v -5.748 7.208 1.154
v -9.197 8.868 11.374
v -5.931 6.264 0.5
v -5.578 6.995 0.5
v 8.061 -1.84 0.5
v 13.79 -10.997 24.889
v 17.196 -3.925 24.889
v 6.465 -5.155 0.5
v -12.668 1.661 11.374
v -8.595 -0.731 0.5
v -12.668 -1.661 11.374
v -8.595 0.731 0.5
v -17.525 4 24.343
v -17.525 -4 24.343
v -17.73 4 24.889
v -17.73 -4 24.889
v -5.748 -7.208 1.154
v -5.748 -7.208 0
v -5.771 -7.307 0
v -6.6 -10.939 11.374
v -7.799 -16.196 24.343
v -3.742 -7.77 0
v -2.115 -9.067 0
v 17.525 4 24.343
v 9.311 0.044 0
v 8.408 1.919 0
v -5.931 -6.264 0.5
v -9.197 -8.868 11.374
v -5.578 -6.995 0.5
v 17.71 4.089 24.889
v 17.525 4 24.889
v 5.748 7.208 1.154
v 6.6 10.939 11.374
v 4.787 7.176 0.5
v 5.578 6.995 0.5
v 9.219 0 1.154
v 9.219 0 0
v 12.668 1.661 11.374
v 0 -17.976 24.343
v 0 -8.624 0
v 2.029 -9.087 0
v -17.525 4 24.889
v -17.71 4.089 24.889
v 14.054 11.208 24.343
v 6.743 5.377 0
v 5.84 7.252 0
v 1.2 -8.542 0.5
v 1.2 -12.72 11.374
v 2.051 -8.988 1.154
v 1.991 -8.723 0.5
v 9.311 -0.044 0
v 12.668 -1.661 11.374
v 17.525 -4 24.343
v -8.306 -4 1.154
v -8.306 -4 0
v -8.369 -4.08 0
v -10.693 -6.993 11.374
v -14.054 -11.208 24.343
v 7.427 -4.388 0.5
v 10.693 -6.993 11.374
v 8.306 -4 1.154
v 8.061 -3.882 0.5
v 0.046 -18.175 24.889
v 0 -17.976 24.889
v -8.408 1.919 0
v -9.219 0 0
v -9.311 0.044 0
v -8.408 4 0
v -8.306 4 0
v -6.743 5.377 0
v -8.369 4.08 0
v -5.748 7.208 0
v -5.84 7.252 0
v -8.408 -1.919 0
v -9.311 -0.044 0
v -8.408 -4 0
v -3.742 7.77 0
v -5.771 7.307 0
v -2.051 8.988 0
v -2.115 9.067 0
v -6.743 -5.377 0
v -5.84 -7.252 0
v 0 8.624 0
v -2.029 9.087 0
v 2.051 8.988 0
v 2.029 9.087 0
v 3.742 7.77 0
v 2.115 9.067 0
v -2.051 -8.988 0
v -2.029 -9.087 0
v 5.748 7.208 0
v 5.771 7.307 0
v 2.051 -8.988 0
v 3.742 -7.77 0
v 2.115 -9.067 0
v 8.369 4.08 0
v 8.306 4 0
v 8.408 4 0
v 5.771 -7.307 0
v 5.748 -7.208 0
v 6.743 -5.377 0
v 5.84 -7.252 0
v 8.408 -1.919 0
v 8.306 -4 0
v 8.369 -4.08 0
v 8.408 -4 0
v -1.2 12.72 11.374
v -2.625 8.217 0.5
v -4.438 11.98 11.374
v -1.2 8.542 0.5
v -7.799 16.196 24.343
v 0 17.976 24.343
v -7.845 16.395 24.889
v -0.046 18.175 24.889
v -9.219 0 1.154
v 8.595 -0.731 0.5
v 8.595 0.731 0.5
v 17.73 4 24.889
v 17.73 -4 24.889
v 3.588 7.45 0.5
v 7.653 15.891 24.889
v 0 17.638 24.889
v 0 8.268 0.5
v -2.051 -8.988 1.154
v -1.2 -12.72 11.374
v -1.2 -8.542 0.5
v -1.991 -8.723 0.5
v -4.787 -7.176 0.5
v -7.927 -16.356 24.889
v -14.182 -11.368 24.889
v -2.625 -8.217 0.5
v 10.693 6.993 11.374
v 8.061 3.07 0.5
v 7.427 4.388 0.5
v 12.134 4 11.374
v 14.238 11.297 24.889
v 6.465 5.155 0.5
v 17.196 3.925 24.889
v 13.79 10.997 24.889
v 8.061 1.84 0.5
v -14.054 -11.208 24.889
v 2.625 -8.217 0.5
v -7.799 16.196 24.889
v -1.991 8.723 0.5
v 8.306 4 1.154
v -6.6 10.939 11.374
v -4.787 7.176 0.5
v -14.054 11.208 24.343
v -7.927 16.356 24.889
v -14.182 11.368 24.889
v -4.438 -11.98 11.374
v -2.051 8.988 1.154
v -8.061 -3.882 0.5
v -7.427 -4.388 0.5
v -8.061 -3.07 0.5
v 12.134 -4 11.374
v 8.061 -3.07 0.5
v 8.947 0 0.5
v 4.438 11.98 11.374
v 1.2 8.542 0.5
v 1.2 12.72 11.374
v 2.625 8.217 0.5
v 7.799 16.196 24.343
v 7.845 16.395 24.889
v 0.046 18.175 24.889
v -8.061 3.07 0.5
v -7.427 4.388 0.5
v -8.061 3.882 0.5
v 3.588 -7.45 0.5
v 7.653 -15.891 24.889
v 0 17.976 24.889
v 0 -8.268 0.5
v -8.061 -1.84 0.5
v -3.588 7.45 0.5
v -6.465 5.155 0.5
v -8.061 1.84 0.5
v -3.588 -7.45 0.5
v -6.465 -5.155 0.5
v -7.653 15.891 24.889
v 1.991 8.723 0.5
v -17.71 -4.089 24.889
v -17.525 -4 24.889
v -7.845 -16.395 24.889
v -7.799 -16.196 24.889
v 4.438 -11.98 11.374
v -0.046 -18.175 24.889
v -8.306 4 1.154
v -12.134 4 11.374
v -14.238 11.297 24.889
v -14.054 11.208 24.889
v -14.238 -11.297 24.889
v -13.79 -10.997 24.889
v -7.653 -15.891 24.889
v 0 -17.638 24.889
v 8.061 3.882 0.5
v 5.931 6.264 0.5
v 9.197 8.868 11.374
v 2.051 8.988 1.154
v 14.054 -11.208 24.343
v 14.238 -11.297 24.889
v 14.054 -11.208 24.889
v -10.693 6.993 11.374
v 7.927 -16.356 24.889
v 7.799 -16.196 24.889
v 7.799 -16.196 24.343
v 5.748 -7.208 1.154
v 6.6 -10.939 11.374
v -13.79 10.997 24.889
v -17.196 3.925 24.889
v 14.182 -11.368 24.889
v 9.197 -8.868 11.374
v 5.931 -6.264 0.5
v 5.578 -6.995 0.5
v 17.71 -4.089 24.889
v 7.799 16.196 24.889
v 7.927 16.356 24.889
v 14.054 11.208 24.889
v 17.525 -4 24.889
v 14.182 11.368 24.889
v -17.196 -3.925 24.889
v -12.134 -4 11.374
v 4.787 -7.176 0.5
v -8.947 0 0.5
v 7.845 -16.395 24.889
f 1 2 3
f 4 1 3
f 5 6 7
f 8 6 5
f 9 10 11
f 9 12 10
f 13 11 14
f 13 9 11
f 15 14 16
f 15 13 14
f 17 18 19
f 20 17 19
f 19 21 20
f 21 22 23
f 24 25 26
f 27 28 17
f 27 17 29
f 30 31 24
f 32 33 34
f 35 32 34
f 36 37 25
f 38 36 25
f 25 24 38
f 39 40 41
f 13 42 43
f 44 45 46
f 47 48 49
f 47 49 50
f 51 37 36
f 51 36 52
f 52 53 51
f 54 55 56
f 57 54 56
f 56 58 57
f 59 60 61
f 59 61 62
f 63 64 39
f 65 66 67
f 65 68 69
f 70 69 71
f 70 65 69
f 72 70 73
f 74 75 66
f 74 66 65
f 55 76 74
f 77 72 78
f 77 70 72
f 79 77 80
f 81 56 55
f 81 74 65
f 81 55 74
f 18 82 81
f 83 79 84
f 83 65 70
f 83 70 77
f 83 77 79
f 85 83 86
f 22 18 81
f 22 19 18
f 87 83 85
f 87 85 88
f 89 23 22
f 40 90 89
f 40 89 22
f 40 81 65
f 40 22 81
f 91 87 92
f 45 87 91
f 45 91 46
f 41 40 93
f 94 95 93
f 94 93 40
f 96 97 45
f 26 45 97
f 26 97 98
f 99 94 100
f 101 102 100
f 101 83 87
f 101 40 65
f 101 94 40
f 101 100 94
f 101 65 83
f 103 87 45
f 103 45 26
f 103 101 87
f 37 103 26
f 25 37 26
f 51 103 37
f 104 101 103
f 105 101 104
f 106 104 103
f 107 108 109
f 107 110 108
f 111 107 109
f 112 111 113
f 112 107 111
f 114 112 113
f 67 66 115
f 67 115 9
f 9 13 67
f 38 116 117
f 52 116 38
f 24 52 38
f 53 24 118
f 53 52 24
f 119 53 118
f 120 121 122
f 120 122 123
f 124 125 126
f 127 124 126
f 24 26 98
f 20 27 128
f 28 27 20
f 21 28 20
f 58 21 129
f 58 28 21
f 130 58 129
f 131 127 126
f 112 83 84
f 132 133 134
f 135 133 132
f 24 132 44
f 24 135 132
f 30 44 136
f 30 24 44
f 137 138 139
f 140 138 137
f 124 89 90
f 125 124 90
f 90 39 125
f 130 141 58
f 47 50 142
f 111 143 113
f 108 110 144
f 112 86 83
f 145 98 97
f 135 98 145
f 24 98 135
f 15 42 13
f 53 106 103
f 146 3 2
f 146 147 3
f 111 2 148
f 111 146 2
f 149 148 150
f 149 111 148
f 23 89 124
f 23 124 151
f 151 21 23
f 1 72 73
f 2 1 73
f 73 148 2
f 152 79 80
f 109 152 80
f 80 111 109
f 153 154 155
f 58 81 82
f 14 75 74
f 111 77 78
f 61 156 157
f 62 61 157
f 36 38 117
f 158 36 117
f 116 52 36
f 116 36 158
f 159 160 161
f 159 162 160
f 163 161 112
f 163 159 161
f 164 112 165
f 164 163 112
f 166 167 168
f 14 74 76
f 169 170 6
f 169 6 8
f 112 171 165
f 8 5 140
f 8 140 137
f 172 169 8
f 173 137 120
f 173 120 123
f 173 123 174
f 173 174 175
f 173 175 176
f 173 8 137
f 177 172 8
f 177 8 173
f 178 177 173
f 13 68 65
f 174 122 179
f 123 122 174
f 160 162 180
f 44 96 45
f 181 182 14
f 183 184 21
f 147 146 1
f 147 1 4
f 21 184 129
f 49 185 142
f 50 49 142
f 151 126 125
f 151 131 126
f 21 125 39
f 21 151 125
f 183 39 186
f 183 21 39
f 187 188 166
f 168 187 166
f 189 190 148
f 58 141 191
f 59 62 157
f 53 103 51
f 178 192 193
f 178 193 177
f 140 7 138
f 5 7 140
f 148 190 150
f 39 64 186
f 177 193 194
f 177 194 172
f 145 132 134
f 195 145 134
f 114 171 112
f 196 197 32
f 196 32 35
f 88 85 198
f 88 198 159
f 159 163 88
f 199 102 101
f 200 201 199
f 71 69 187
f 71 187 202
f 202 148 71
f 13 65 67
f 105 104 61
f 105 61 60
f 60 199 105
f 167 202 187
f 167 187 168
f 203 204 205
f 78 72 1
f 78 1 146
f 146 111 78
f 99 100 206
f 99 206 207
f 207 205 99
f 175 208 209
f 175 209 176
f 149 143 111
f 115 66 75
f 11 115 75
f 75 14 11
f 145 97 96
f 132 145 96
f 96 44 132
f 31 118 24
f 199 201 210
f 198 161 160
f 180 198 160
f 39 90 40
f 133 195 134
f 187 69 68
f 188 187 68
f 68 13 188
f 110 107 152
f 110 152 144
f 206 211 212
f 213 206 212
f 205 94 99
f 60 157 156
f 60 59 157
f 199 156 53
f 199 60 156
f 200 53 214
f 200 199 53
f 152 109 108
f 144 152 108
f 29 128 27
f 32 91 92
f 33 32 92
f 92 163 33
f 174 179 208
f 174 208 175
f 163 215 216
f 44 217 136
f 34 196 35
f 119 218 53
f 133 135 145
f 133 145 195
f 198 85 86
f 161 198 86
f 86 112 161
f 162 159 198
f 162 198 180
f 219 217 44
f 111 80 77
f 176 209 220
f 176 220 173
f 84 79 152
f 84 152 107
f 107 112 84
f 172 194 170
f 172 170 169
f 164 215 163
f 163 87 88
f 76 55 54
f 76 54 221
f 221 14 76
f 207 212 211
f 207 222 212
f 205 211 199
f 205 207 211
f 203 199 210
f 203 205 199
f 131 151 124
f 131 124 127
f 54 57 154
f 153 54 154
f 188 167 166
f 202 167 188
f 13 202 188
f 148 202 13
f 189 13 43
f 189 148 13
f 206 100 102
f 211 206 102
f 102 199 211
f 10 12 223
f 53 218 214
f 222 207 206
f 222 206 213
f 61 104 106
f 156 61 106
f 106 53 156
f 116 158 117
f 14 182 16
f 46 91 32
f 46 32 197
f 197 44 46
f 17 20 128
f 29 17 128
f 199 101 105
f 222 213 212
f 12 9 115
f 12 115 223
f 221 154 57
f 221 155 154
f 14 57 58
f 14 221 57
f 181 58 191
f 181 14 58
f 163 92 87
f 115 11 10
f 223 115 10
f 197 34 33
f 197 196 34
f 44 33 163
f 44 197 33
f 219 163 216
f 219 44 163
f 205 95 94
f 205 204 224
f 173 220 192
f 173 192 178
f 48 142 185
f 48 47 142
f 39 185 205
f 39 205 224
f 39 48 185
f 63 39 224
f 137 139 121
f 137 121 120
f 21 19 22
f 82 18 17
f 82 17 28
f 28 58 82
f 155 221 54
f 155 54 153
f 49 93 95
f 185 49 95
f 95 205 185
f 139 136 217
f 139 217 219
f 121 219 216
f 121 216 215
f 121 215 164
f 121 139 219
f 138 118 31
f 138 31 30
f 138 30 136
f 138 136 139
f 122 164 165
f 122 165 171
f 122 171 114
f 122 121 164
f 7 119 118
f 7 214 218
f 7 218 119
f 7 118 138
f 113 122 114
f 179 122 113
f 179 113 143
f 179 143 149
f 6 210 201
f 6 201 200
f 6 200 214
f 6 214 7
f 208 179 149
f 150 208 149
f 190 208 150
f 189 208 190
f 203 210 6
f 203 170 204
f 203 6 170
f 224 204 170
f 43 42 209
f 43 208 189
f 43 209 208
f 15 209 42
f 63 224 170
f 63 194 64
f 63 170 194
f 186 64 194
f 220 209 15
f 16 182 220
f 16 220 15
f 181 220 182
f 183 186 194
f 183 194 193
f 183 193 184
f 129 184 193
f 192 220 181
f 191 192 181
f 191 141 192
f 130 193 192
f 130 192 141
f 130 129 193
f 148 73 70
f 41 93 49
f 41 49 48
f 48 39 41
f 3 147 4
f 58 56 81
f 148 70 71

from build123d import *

# Parameters (mm, degrees)
F1_DEPTH      = 4
F1_DEPTH_BACK = 4
F2_COUNT      = 14


with BuildPart() as f1:
    # F0 (on Front) → F1 (new body, two sides)
    with BuildSketch(Plane.XZ) as f1_sk:
        Polygon((0, 0.5), (0, 0), (8.40777345, 0), (17.7297703922, 24.8893443495), (17.1958512824, 24.8893443495), (8.0611231732, 0.5), align=None)
    extrude(amount=F1_DEPTH)
    extrude(f1_sk.sketch, amount=-F1_DEPTH_BACK)

    # F2: F1 ×14 about axis
    f2_axis = Axis((0, 0, 1.0500000276), (0, 0, -1))


with BuildPart() as f1_1:
    add(f1.part)
    for i in range(1, F2_COUNT):
        add(f1.part.rotate(f2_axis, i * 360 / F2_COUNT))


solid = f1_1.part
